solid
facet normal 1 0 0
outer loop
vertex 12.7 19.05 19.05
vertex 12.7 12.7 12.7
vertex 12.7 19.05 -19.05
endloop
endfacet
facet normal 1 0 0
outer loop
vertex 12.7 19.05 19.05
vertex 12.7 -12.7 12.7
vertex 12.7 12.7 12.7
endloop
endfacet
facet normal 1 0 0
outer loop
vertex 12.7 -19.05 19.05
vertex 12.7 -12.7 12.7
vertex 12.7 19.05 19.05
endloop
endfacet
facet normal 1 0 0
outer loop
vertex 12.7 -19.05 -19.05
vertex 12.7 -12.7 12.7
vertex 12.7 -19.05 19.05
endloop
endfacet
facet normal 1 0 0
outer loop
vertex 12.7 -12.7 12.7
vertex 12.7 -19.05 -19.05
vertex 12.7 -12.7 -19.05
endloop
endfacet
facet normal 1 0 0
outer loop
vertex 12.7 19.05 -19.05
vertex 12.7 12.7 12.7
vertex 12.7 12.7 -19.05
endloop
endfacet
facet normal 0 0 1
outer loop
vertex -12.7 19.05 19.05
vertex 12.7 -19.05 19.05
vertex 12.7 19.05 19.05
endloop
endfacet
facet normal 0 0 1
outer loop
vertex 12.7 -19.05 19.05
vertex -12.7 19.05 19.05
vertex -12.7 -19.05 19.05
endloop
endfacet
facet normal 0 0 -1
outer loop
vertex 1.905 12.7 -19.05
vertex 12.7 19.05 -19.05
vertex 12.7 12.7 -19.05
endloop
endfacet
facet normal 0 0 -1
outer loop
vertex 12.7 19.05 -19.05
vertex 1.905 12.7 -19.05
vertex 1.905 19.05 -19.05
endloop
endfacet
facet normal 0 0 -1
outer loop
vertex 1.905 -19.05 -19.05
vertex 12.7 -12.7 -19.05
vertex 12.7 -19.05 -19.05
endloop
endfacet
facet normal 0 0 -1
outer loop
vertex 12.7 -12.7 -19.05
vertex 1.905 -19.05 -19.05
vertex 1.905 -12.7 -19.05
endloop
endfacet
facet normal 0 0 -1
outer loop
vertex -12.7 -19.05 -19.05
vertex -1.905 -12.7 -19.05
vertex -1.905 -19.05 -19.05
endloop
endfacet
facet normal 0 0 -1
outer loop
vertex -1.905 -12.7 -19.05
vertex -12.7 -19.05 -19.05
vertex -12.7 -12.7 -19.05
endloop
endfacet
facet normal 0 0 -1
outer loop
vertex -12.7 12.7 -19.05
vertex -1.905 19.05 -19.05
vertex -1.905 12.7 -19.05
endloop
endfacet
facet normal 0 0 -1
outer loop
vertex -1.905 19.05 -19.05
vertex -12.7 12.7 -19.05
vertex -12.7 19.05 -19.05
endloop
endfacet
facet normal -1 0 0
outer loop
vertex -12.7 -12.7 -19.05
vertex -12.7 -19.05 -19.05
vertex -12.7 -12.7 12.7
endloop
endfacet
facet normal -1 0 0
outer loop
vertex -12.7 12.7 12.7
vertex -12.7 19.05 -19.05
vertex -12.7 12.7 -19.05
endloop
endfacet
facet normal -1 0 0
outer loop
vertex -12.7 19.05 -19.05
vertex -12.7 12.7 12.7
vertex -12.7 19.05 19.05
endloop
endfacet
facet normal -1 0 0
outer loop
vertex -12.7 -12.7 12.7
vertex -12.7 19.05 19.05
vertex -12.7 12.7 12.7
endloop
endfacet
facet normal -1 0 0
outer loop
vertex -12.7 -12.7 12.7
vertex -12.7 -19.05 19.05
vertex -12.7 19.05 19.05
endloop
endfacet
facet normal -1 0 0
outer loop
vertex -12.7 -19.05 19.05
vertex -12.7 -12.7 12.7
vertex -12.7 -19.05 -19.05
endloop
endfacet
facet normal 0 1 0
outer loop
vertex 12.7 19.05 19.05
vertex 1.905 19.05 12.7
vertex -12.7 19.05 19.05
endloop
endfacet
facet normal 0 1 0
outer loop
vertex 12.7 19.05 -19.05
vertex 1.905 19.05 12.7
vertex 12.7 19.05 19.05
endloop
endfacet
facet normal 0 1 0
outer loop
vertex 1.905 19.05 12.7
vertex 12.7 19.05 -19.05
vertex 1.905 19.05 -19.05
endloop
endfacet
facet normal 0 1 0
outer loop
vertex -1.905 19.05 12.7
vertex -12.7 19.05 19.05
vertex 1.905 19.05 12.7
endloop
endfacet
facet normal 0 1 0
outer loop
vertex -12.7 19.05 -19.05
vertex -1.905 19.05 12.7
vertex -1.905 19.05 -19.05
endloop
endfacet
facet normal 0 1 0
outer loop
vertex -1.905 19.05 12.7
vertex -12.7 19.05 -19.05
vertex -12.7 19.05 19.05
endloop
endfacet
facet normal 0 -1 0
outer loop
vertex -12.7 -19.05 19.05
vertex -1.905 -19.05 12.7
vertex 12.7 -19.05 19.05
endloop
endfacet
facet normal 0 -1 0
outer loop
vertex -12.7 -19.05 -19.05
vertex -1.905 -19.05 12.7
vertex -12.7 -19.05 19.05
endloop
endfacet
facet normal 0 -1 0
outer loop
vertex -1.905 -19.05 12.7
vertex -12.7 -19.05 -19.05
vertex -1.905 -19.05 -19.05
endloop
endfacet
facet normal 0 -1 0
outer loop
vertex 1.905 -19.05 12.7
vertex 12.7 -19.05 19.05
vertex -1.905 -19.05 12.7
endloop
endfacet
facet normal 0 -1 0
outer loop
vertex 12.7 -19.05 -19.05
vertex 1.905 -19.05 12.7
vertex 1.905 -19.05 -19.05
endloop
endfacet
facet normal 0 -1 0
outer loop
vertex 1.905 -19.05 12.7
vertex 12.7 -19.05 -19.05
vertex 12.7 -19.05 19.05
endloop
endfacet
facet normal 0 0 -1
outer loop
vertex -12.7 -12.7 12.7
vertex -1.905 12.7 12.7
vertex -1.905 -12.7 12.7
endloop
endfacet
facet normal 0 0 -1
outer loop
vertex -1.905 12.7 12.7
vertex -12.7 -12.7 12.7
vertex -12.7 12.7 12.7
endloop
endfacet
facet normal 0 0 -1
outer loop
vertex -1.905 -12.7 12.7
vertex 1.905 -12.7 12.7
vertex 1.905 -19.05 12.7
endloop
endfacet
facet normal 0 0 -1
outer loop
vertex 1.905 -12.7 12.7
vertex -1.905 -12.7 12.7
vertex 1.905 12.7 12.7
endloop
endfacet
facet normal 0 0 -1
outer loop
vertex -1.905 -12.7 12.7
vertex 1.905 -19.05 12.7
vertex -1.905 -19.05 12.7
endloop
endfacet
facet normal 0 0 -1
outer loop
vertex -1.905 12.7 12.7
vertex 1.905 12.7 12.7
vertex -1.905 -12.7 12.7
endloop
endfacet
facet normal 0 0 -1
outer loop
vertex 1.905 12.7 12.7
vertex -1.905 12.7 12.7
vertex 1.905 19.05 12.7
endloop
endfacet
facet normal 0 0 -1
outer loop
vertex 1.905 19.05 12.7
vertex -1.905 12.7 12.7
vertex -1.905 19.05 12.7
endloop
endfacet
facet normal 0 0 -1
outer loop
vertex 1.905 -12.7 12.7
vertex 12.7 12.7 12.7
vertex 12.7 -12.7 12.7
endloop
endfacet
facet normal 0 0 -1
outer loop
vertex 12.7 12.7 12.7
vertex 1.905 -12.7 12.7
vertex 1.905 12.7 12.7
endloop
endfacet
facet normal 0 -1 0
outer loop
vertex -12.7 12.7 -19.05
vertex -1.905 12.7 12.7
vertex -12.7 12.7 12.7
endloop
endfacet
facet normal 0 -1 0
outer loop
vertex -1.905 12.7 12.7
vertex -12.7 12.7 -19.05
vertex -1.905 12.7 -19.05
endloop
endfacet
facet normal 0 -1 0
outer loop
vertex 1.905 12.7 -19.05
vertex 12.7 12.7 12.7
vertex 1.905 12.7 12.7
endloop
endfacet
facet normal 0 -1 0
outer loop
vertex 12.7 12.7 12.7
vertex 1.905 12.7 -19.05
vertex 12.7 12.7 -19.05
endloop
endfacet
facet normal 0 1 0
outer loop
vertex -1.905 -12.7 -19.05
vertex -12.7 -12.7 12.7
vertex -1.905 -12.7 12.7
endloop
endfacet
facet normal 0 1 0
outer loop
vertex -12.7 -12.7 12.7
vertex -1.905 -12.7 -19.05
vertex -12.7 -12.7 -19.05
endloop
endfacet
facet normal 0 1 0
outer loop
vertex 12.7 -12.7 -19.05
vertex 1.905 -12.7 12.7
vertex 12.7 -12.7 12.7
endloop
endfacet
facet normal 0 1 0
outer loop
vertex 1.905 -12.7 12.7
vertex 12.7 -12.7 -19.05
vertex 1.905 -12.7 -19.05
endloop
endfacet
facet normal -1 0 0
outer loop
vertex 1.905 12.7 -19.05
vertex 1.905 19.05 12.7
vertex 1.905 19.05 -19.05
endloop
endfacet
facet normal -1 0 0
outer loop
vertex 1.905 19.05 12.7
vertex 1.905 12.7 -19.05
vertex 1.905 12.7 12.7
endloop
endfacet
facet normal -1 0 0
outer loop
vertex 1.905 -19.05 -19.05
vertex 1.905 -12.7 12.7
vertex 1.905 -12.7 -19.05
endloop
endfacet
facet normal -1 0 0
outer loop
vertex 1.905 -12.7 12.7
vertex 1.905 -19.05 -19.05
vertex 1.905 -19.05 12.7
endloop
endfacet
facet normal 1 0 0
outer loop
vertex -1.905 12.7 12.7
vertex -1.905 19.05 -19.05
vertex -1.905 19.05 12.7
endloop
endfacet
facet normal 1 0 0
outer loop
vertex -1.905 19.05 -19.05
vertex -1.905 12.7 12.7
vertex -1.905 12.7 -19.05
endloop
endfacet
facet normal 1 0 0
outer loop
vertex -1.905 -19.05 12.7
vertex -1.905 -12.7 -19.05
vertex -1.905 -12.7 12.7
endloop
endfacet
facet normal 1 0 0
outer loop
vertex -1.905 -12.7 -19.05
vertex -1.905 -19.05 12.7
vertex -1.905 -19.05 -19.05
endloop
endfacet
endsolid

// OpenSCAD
$fn=100;

in=25.4;

l=1*in;
w=l;
h=l;

d8=0.136*in;

difference()
{
cube([l,1.5*w,1.5*h], center=true);
translate([0,0,-.25*in]) cube([l,w,1.5*h], center=true);
#translate([0,0,-.25*in])cube([.15*in, 2*in, 1.5*in], center=true);


}
